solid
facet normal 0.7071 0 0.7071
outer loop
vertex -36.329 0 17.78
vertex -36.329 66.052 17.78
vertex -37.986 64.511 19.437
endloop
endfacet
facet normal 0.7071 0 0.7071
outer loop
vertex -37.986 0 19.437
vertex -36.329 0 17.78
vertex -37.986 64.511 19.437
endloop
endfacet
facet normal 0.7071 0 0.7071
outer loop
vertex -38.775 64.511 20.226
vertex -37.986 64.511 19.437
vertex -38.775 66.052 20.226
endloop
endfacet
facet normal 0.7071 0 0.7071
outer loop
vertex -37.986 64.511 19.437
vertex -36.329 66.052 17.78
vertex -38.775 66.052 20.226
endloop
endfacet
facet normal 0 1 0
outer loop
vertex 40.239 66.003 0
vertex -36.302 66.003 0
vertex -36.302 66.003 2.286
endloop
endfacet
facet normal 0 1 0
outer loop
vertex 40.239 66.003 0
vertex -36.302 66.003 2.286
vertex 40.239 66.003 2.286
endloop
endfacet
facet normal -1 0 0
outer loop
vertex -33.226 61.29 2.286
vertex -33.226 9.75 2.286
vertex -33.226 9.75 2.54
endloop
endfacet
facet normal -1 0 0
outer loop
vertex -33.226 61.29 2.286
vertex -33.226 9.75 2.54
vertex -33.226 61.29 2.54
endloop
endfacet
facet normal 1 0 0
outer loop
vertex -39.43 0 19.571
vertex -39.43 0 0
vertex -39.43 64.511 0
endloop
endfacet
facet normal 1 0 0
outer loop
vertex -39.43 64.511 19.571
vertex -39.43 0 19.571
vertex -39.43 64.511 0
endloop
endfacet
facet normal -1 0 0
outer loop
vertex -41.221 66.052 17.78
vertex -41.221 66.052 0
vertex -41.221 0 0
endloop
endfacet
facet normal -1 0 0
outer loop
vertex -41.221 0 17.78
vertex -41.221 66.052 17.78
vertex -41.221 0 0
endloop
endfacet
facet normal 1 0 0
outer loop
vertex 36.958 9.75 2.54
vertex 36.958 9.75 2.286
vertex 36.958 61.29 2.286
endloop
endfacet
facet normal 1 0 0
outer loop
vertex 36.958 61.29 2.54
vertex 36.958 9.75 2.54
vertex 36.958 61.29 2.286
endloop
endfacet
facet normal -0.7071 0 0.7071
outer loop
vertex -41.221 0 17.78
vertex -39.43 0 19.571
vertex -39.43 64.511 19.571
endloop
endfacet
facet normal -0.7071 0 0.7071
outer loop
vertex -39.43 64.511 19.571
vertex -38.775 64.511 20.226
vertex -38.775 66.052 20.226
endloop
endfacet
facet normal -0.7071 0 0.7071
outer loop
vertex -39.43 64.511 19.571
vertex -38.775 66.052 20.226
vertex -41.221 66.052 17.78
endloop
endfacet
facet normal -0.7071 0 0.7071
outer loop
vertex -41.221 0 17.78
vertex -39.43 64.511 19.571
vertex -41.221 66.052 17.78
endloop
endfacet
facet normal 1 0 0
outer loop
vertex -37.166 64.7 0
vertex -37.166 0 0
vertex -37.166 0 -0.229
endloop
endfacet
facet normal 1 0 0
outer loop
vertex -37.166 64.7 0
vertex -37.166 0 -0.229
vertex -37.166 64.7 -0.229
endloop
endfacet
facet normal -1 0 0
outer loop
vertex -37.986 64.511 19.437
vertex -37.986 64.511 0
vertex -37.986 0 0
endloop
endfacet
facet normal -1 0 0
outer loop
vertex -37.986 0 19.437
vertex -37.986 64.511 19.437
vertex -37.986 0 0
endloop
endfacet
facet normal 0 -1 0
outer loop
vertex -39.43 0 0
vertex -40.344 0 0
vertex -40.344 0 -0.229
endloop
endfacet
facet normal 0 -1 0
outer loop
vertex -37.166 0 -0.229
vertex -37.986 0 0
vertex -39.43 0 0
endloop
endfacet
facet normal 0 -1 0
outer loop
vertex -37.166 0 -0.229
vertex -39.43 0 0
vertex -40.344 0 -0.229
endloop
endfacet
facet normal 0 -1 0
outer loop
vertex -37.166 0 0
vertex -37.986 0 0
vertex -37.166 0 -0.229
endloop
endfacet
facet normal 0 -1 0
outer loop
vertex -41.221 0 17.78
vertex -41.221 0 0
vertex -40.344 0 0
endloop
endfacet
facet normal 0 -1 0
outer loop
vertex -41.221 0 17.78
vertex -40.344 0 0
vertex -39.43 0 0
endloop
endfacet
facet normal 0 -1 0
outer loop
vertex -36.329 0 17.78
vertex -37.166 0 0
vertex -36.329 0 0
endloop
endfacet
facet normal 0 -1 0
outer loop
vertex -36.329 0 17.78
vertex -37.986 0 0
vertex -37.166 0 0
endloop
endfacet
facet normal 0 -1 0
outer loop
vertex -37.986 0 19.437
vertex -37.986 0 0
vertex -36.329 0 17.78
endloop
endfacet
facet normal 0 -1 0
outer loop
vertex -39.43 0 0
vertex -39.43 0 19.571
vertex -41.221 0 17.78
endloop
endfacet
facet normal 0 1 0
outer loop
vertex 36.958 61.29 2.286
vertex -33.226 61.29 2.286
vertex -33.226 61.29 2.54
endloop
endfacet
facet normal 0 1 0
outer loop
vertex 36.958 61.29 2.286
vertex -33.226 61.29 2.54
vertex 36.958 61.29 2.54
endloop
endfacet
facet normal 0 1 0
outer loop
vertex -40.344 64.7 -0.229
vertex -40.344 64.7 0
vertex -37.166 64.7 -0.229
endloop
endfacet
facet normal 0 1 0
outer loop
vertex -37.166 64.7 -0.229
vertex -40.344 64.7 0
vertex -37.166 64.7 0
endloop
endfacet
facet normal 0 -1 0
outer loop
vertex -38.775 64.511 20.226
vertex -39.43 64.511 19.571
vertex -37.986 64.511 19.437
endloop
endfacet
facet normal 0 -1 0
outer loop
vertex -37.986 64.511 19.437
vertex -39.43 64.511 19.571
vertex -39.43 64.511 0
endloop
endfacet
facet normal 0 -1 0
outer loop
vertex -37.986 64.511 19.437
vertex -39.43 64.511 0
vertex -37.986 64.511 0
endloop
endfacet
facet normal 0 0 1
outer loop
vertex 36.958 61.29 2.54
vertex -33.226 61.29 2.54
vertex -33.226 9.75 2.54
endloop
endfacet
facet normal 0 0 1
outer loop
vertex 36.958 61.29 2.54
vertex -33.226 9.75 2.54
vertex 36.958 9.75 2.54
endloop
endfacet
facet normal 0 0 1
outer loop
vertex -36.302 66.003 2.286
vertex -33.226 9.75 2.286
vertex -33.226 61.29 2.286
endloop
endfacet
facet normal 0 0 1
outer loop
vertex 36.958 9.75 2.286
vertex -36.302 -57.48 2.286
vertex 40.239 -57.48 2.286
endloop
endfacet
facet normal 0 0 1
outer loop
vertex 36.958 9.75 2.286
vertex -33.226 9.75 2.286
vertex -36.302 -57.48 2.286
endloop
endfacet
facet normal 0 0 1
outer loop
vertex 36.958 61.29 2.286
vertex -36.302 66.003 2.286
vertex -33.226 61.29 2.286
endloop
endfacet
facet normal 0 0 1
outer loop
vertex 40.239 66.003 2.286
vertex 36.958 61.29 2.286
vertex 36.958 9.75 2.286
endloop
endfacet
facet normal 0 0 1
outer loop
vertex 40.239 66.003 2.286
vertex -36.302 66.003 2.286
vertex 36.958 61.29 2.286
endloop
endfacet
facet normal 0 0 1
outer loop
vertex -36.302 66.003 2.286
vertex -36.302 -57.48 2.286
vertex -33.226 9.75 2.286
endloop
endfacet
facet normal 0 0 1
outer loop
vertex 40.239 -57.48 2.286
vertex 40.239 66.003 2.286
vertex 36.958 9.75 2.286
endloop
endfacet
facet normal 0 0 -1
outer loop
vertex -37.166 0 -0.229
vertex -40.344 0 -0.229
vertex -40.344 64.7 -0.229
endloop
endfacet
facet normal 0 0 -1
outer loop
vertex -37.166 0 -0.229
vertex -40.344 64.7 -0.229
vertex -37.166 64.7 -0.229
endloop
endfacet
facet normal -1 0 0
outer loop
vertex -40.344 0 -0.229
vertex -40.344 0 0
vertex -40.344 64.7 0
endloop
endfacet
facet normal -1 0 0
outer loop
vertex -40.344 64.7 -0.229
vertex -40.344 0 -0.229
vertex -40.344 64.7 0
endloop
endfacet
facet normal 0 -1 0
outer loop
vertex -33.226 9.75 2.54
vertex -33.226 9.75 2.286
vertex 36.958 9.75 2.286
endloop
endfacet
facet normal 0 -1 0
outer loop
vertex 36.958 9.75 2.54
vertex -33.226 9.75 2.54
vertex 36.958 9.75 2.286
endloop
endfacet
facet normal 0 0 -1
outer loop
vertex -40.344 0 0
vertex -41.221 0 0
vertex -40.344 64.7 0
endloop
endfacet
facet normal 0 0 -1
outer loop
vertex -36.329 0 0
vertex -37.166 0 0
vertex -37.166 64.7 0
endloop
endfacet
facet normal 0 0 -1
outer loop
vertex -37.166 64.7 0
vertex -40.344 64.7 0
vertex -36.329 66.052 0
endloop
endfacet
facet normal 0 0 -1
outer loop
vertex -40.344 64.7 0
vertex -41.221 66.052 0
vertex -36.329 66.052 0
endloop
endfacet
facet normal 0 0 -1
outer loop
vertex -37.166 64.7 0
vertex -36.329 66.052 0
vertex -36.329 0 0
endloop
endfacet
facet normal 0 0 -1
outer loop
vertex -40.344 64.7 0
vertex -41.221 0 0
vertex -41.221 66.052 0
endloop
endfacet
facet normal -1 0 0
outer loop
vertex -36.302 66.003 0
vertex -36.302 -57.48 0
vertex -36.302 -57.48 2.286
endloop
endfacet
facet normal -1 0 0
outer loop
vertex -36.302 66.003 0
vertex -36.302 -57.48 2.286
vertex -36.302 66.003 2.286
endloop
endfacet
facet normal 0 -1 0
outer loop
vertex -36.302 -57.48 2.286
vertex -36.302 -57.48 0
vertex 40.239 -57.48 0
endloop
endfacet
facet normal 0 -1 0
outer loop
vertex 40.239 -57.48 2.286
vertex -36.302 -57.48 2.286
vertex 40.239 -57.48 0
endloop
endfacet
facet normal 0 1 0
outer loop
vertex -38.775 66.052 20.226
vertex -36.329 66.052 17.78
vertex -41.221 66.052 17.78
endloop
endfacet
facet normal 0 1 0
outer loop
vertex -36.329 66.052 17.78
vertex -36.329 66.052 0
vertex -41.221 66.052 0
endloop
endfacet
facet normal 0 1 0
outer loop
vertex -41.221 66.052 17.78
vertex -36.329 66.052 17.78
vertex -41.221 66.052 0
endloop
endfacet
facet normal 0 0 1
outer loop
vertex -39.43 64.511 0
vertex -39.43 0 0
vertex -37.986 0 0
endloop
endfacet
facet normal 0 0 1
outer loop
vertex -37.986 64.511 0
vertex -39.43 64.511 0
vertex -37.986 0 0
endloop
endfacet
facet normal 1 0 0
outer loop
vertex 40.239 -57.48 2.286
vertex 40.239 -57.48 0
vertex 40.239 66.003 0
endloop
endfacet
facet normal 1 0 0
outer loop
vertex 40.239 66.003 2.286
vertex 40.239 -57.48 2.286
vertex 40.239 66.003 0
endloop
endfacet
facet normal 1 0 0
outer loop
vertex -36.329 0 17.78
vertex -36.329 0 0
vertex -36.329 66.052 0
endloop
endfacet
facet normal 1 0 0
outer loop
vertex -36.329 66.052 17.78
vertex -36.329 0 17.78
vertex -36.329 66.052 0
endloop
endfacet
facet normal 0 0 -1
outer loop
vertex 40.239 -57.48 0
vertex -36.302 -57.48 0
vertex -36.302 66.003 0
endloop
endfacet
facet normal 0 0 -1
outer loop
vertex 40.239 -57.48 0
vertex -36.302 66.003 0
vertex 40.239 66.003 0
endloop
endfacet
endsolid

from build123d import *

# Parameters (mm, degrees)
F0_W        = 76.5407979488
F0_H        = 123.4830245376
F1_DEPTH    = 2.286
F3_DEPTH    = 20.32
F4_W        = 70.1841525733
F4_H        = 51.5401670709
F5_DEPTH    = 2.54
F6_W        = 3.1785480678
F6_H        = 64.6996945143
F7_DEPTH    = 0.2286
F8_T1_DEPTH = 79.1161617244


# Not quite as in the source:
# - a fillet or chamfer that OpenCascade refuses, or shapes differently, is made with other operations: its cross-section is extruded or revolved along the edge and cut away or added


with BuildPart() as f1:
    # F0 (on Top) → F1 (new body)
    with BuildSketch(Plane.XY):
        with Locations((1.9688718021, 4.2612589896)):
            Rectangle(F0_W, F0_H)
    extrude(amount=F1_DEPTH)

    # F4 (on Top) → F5 (join)
    with BuildSketch(Plane.XY):
        with Locations((1.8656272441, 35.5202662759)):
            Rectangle(F4_W, F4_H)
    extrude(amount=F5_DEPTH)


with BuildPart() as f3:
    # F2 (on Top) → F3 (new body)
    with BuildSketch(Plane.XY):
        Polygon((-36.3286137581, 0), (-36.3286137581, 66.0520121455), (-41.2212088704, 66.0520121455), (-41.2212088704, 0), (-39.4303016365, 0), (-39.4303016365, 64.5106732845), (-37.9857048392, 64.5106732845), (-37.9857048392, 0), align=None)
    extrude(amount=F3_DEPTH)

    # F6 (on Top) → F7 (join)
    with BuildSketch(Plane.XY):
        with Locations((-38.7550909072, 32.3498472571)):
            Rectangle(F6_W, F6_H)
    extrude(amount=-F7_DEPTH)

    # F8: chamfer of 2.54 on 2 edges, made by hand

    # F8_s2 → F8_t1 (cut)
    with BuildSketch(Plane.XZ.offset(-72.584086935)):
        Polygon((-36.3286137581, 17.78), (-38.8686137581, 20.32), (-36.3286137581, 20.32), align=None)
        Polygon((-38.6812088704, 20.32), (-41.2212088704, 17.78), (-41.2212088704, 20.32), align=None)
    extrude(amount=F8_T1_DEPTH, mode=Mode.SUBTRACT)


solid = Compound([f1.part, f3.part])
